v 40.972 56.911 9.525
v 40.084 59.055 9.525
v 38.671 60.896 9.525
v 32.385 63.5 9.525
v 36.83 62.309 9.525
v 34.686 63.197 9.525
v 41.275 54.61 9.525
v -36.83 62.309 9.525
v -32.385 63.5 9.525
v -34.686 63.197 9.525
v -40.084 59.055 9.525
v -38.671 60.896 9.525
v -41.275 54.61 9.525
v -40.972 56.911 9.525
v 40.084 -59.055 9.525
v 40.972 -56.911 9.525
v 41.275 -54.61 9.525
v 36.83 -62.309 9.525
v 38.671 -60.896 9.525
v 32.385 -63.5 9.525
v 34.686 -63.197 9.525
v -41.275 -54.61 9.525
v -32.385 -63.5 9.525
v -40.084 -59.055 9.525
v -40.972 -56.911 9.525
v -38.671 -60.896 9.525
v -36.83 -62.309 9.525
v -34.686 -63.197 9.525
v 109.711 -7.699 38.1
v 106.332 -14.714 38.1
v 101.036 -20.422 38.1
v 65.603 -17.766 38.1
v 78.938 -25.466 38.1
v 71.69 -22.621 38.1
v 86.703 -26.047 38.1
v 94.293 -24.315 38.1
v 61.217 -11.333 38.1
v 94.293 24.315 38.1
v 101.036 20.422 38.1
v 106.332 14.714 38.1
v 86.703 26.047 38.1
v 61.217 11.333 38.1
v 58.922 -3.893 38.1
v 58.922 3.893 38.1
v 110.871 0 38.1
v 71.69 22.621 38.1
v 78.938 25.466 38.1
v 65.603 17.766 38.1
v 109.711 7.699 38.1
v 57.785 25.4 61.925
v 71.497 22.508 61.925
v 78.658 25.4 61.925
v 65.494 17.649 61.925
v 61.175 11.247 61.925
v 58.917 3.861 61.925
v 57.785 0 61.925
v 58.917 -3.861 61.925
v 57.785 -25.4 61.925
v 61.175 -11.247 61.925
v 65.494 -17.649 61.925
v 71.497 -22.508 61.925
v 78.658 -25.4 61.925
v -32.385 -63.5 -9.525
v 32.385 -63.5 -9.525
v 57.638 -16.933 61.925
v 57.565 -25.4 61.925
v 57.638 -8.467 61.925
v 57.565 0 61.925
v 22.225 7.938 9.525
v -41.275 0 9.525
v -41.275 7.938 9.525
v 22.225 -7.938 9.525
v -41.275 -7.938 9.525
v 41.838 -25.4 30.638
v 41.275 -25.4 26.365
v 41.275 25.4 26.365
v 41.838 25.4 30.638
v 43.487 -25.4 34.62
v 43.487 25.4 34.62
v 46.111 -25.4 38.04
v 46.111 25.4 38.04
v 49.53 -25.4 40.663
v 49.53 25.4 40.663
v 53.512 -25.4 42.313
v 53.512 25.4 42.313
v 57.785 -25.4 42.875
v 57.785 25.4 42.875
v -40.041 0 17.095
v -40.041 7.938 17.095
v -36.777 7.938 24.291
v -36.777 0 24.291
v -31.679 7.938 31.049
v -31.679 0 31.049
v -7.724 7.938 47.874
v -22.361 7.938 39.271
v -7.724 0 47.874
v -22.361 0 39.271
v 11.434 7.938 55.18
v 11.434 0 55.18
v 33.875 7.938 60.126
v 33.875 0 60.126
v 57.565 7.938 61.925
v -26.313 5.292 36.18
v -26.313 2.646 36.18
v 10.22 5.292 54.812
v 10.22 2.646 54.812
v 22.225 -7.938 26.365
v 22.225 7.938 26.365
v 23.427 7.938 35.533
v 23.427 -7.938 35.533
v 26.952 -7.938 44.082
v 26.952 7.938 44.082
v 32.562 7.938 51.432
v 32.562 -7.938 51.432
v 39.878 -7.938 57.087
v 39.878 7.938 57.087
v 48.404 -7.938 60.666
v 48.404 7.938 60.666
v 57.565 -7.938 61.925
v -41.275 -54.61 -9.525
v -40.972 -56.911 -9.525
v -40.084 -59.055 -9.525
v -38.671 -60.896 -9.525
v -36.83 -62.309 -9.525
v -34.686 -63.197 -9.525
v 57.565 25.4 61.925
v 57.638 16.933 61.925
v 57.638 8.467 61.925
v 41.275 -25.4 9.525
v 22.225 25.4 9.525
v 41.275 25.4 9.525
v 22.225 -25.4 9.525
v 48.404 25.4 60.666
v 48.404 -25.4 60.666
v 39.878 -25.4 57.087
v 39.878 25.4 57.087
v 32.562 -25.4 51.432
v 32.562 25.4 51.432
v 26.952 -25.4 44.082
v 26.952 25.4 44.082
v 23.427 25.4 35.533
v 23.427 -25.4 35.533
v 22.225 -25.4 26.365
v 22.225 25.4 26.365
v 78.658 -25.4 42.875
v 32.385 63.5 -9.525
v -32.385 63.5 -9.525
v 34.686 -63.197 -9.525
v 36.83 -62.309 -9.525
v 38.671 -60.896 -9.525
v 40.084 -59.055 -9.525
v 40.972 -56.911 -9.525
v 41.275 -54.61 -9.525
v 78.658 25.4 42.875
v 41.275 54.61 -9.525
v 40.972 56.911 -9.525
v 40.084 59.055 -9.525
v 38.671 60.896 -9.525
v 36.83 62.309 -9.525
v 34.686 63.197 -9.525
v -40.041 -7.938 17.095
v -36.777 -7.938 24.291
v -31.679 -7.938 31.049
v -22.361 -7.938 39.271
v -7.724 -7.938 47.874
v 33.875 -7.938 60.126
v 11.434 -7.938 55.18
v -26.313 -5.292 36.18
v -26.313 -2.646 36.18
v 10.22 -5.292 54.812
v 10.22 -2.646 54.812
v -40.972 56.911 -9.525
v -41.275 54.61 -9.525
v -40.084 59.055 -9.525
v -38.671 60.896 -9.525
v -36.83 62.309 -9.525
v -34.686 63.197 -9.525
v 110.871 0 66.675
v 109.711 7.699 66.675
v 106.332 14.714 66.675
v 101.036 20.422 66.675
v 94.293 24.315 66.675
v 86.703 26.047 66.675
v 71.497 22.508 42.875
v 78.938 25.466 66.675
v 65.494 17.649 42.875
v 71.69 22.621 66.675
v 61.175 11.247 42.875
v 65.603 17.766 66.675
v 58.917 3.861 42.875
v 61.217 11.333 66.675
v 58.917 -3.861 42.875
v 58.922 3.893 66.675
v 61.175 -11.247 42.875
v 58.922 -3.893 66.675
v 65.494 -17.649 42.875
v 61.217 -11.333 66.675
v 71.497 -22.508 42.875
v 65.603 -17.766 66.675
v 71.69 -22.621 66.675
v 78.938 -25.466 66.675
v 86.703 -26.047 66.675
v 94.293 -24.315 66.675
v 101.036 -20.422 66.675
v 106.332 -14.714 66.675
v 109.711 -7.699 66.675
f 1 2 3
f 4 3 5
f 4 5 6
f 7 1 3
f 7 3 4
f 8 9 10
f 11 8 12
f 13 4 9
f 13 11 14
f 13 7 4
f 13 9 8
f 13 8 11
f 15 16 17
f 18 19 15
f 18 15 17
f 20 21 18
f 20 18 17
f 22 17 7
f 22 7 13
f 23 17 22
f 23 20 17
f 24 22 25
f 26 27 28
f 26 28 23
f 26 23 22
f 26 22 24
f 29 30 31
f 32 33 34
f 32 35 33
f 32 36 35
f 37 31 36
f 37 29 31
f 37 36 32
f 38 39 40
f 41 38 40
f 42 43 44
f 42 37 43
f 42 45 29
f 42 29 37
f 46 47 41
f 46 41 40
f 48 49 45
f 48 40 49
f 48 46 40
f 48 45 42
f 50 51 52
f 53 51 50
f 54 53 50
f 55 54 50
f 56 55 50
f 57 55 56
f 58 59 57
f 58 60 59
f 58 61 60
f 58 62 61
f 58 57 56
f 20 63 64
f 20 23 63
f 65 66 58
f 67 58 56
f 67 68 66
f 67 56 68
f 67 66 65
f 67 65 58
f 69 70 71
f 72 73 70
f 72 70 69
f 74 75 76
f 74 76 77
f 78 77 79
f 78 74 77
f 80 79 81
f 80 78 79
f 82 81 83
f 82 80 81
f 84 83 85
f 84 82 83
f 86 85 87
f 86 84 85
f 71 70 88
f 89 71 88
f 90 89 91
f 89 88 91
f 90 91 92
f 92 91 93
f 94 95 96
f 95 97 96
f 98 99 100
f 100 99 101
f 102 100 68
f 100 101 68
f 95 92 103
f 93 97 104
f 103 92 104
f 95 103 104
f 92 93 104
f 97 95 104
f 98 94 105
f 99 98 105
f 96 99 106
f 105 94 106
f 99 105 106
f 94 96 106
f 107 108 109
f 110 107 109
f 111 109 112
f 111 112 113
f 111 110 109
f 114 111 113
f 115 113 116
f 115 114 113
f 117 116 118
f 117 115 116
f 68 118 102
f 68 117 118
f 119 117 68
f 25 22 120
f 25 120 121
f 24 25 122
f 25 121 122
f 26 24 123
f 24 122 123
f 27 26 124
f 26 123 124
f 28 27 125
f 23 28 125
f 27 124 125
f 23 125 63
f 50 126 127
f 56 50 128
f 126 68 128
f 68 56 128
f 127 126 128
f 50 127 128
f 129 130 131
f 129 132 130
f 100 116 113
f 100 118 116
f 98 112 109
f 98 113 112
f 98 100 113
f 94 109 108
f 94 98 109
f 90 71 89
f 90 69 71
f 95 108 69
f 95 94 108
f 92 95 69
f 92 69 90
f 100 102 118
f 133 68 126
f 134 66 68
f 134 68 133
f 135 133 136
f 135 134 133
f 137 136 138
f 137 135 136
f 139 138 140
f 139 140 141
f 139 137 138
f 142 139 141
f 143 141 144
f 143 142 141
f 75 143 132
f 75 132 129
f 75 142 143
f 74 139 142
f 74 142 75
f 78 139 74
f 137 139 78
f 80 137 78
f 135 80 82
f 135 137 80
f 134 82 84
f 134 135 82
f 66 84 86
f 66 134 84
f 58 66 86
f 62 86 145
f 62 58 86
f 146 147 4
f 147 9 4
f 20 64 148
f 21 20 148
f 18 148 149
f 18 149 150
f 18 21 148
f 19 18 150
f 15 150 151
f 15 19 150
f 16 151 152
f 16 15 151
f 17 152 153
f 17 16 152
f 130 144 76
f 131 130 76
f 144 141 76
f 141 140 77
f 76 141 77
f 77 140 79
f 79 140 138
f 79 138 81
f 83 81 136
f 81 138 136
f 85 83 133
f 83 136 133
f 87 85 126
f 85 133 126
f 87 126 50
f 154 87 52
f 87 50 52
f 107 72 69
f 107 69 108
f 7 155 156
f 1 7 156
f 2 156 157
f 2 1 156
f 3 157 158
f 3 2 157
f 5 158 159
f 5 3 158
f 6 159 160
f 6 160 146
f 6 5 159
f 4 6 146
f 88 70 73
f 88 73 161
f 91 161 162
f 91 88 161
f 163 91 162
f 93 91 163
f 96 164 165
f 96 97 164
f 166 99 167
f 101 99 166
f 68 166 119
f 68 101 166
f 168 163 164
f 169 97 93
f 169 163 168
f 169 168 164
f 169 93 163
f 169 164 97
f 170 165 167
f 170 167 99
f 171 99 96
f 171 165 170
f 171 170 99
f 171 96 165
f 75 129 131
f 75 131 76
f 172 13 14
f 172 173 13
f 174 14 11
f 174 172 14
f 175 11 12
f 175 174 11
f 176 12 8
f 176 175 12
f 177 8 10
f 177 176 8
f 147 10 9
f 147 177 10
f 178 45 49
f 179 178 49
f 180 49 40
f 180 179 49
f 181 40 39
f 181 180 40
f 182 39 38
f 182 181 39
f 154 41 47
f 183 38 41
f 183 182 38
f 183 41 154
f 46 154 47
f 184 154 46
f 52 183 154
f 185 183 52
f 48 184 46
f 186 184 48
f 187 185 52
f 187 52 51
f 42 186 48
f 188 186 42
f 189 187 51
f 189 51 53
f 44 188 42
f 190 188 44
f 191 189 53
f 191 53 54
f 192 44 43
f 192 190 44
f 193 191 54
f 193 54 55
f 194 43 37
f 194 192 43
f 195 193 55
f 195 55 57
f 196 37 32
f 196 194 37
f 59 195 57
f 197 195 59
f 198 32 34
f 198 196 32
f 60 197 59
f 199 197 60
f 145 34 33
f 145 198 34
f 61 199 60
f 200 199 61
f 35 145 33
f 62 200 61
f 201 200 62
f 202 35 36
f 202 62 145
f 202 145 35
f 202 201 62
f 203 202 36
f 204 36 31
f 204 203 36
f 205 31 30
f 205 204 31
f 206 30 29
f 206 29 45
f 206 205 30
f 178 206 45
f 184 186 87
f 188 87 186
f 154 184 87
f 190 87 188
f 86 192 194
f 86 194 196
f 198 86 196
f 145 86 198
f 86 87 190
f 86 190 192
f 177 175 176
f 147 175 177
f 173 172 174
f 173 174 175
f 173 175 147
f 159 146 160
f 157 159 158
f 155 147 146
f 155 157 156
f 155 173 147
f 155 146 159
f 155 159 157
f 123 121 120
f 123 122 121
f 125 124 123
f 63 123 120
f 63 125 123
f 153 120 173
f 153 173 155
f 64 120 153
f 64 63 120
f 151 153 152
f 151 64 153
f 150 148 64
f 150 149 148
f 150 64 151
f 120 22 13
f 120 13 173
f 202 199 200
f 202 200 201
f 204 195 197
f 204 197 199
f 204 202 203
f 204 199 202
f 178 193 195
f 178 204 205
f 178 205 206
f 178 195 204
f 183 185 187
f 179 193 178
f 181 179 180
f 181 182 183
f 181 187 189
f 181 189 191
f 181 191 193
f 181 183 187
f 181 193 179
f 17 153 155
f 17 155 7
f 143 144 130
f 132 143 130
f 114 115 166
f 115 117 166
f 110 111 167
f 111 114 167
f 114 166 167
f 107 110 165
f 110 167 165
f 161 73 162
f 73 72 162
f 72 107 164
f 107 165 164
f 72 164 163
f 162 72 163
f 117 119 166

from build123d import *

# Parameters (mm, degrees)
F1_DEPTH = 63.5
F0_W     = 24.6795253844
F0_H     = 19.05
F2_DEPTH = 25.4
F3_DEPTH = 7.9375
F5_R     = 8.89


with BuildPart() as f1:
    # F0 (on Front) → F1 (new body, symmetric)
    with BuildSketch(Plane.XZ):
        Polygon((-41.275, -9.525), (41.275, -9.525), (41.275, 9.525), (22.225, 9.525), (-41.275, 9.525), align=None)
    extrude(amount=F1_DEPTH, both=True)

    # F5
    f5_edges = [f1.edges().sort_by_distance(p)[0] for p in [
        (41.275, -63.5, 0),
        (-41.275, -63.5, 0),
        (41.275, 63.5, 0),
        (-41.275, 63.5, 0),
    ]]
    fillet(f5_edges, radius=F5_R)


with BuildPart() as f2:
    # F0 (on Front) → F2 (new body, symmetric)
    with BuildSketch(Plane.XZ):
        with BuildLine():
            Line((22.225, 9.525), (41.275, 9.525))
            Line((41.275, 9.525), (41.275, 26.3652))
            ThreePointArc((41.275, 26.3652), (46.1106670426, 38.0395329574), (57.785, 42.8752))
            Line((57.785, 42.8752), (60.071, 42.8752))
            Line((60.071, 42.8752), (60.071, 61.9252))
            Line((60.071, 61.9252), (57.785, 61.9252))
            add(Edge.make_bspline(
                [(57.5646027355, 61.9245169935), (57.6380683633, 61.9247949798), (57.711534172, 61.9250226661), (57.785, 61.9252)],
                knots=[111.8982407791, 111.8982407791, 111.8982407791, 111.8982407791, 112.0654476636, 112.0654476636, 112.0654476636, 112.0654476636], degree=3))
            ThreePointArc((57.5646027355, 61.9245169935), (32.5624810266, 51.4318738248), (22.225, 26.3652))
            Line((22.225, 26.3652), (22.225, 9.525))
        make_face()
        with Locations((72.4107626922, 52.4002)):
            Rectangle(F0_W, F0_H)
    extrude(amount=F2_DEPTH, both=True)

    # F0 (on Front) → F4 (revolve)
    with BuildSketch(Plane.XZ):
        Polygon((84.7505253844, 61.9252), (84.7505253844, 42.8752), (84.7505253844, 38.1), (110.871, 38.1), (110.871, 66.675), (84.7505253844, 66.675), align=None)
    revolve(axis=Axis((84.7505253844, 0, 52.3875), (0, 0, 1)))


with BuildPart() as f3:
    # F0 (on Front) → F3 (new body, symmetric)
    with BuildSketch(Plane.XZ):
        with BuildLine():
            add(Edge.make_bspline(
                [(-41.275, 9.525), (-40.6837804171, 39.0253399318), (8.3999135259, 61.7384829553), (57.5646027355, 61.9245169935)],
                knots=[0, 0, 0, 0, 111.8982407791, 111.8982407791, 111.8982407791, 111.8982407791], degree=3))
            Line((-41.275, 9.525), (22.225, 9.525))
            Line((22.225, 9.525), (22.225, 26.3652))
            ThreePointArc((22.225, 26.3652), (32.5624810266, 51.4318738248), (57.5646027355, 61.9245169935))
        make_face()
    extrude(amount=F3_DEPTH, both=True)


solid = Compound([f1.part, f2.part, f3.part])
